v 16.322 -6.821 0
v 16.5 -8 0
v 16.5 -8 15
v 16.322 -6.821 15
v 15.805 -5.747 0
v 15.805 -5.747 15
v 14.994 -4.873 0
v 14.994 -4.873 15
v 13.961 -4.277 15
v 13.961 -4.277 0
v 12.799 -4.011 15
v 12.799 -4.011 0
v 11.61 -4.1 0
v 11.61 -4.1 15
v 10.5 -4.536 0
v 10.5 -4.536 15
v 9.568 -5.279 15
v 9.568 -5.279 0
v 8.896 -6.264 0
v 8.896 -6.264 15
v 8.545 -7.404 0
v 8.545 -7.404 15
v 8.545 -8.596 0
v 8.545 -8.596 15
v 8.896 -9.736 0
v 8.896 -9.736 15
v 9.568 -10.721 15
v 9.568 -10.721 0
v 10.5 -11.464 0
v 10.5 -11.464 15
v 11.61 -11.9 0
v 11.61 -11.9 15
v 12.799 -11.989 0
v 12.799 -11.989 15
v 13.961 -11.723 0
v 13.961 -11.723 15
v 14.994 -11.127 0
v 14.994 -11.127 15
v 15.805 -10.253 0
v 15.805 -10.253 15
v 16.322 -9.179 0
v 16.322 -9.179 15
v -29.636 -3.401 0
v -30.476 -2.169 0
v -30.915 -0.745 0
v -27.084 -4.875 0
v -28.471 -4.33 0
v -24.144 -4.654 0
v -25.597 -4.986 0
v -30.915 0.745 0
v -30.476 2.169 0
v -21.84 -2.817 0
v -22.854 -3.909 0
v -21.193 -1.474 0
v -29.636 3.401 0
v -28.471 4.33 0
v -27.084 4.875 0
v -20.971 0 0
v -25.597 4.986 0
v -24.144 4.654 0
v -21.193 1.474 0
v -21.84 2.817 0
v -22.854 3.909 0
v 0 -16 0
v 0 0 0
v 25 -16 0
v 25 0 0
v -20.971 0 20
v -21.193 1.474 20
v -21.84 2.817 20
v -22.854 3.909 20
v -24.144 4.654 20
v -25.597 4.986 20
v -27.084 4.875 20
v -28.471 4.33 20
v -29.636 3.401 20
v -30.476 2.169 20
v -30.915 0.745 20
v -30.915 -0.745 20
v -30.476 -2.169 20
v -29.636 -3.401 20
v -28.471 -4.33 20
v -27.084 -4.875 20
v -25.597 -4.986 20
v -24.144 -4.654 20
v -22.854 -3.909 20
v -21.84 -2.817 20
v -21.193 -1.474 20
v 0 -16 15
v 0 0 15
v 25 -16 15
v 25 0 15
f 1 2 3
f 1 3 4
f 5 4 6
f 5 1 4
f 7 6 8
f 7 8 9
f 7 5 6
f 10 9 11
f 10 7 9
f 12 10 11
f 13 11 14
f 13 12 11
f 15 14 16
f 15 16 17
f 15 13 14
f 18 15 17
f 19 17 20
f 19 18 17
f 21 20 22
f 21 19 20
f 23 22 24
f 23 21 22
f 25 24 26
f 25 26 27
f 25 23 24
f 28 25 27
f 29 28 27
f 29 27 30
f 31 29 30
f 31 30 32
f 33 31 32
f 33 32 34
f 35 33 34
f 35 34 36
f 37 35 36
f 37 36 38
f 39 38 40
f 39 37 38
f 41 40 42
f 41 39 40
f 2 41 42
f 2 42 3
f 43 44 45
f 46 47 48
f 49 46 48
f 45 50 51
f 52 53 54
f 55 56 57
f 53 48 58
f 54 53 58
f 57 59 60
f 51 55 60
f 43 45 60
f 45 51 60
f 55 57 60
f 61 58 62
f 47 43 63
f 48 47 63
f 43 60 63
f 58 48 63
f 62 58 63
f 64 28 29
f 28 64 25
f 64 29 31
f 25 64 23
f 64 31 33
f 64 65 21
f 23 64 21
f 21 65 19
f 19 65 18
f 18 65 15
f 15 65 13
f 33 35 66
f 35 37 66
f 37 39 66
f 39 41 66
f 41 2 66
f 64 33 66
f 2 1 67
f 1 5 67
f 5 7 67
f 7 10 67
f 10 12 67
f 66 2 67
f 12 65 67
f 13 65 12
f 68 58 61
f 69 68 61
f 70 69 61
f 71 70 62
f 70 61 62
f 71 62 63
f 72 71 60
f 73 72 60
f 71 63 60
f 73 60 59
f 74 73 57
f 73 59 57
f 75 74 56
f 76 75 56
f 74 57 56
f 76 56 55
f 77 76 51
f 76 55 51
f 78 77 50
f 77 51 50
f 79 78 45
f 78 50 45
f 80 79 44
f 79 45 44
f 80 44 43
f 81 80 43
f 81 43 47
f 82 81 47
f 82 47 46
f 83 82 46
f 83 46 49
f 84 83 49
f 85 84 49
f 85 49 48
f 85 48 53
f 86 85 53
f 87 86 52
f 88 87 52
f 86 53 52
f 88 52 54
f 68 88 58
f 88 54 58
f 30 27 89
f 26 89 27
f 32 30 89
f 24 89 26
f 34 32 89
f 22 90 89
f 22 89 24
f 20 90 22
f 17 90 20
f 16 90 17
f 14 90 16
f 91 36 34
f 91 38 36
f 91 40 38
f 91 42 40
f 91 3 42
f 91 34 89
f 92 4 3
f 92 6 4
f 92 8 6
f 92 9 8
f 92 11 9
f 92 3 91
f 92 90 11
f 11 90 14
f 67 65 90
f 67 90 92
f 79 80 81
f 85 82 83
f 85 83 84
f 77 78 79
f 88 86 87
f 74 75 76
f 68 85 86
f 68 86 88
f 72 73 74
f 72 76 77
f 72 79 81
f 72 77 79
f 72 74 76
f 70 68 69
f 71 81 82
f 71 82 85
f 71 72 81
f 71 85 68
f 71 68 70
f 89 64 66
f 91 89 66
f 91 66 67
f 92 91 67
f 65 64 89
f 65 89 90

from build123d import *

# Parameters (mm, degrees)
F0_W     = 25
F0_H     = 16
F0_R     = 4
F1_DEPTH = 15
F2_R     = 5
F3_DEPTH = 20


with BuildPart() as f1:
    # F0 (on Top) → F1 (new body)
    with BuildSketch(Plane.XY):
        with Locations((12.5, -8)):
            Rectangle(F0_W, F0_H)
        with Locations((12.5, -8)):
            Circle(F0_R, mode=Mode.SUBTRACT)
    extrude(amount=F1_DEPTH)


with BuildPart() as f3:
    # F2 (on Top) → F3 (new body)
    with BuildSketch(Plane.XY):
        with Locations((-25.971068, 0)):
            Circle(F2_R)
    extrude(amount=F3_DEPTH)


solid = Compound([f1.part, f3.part])
